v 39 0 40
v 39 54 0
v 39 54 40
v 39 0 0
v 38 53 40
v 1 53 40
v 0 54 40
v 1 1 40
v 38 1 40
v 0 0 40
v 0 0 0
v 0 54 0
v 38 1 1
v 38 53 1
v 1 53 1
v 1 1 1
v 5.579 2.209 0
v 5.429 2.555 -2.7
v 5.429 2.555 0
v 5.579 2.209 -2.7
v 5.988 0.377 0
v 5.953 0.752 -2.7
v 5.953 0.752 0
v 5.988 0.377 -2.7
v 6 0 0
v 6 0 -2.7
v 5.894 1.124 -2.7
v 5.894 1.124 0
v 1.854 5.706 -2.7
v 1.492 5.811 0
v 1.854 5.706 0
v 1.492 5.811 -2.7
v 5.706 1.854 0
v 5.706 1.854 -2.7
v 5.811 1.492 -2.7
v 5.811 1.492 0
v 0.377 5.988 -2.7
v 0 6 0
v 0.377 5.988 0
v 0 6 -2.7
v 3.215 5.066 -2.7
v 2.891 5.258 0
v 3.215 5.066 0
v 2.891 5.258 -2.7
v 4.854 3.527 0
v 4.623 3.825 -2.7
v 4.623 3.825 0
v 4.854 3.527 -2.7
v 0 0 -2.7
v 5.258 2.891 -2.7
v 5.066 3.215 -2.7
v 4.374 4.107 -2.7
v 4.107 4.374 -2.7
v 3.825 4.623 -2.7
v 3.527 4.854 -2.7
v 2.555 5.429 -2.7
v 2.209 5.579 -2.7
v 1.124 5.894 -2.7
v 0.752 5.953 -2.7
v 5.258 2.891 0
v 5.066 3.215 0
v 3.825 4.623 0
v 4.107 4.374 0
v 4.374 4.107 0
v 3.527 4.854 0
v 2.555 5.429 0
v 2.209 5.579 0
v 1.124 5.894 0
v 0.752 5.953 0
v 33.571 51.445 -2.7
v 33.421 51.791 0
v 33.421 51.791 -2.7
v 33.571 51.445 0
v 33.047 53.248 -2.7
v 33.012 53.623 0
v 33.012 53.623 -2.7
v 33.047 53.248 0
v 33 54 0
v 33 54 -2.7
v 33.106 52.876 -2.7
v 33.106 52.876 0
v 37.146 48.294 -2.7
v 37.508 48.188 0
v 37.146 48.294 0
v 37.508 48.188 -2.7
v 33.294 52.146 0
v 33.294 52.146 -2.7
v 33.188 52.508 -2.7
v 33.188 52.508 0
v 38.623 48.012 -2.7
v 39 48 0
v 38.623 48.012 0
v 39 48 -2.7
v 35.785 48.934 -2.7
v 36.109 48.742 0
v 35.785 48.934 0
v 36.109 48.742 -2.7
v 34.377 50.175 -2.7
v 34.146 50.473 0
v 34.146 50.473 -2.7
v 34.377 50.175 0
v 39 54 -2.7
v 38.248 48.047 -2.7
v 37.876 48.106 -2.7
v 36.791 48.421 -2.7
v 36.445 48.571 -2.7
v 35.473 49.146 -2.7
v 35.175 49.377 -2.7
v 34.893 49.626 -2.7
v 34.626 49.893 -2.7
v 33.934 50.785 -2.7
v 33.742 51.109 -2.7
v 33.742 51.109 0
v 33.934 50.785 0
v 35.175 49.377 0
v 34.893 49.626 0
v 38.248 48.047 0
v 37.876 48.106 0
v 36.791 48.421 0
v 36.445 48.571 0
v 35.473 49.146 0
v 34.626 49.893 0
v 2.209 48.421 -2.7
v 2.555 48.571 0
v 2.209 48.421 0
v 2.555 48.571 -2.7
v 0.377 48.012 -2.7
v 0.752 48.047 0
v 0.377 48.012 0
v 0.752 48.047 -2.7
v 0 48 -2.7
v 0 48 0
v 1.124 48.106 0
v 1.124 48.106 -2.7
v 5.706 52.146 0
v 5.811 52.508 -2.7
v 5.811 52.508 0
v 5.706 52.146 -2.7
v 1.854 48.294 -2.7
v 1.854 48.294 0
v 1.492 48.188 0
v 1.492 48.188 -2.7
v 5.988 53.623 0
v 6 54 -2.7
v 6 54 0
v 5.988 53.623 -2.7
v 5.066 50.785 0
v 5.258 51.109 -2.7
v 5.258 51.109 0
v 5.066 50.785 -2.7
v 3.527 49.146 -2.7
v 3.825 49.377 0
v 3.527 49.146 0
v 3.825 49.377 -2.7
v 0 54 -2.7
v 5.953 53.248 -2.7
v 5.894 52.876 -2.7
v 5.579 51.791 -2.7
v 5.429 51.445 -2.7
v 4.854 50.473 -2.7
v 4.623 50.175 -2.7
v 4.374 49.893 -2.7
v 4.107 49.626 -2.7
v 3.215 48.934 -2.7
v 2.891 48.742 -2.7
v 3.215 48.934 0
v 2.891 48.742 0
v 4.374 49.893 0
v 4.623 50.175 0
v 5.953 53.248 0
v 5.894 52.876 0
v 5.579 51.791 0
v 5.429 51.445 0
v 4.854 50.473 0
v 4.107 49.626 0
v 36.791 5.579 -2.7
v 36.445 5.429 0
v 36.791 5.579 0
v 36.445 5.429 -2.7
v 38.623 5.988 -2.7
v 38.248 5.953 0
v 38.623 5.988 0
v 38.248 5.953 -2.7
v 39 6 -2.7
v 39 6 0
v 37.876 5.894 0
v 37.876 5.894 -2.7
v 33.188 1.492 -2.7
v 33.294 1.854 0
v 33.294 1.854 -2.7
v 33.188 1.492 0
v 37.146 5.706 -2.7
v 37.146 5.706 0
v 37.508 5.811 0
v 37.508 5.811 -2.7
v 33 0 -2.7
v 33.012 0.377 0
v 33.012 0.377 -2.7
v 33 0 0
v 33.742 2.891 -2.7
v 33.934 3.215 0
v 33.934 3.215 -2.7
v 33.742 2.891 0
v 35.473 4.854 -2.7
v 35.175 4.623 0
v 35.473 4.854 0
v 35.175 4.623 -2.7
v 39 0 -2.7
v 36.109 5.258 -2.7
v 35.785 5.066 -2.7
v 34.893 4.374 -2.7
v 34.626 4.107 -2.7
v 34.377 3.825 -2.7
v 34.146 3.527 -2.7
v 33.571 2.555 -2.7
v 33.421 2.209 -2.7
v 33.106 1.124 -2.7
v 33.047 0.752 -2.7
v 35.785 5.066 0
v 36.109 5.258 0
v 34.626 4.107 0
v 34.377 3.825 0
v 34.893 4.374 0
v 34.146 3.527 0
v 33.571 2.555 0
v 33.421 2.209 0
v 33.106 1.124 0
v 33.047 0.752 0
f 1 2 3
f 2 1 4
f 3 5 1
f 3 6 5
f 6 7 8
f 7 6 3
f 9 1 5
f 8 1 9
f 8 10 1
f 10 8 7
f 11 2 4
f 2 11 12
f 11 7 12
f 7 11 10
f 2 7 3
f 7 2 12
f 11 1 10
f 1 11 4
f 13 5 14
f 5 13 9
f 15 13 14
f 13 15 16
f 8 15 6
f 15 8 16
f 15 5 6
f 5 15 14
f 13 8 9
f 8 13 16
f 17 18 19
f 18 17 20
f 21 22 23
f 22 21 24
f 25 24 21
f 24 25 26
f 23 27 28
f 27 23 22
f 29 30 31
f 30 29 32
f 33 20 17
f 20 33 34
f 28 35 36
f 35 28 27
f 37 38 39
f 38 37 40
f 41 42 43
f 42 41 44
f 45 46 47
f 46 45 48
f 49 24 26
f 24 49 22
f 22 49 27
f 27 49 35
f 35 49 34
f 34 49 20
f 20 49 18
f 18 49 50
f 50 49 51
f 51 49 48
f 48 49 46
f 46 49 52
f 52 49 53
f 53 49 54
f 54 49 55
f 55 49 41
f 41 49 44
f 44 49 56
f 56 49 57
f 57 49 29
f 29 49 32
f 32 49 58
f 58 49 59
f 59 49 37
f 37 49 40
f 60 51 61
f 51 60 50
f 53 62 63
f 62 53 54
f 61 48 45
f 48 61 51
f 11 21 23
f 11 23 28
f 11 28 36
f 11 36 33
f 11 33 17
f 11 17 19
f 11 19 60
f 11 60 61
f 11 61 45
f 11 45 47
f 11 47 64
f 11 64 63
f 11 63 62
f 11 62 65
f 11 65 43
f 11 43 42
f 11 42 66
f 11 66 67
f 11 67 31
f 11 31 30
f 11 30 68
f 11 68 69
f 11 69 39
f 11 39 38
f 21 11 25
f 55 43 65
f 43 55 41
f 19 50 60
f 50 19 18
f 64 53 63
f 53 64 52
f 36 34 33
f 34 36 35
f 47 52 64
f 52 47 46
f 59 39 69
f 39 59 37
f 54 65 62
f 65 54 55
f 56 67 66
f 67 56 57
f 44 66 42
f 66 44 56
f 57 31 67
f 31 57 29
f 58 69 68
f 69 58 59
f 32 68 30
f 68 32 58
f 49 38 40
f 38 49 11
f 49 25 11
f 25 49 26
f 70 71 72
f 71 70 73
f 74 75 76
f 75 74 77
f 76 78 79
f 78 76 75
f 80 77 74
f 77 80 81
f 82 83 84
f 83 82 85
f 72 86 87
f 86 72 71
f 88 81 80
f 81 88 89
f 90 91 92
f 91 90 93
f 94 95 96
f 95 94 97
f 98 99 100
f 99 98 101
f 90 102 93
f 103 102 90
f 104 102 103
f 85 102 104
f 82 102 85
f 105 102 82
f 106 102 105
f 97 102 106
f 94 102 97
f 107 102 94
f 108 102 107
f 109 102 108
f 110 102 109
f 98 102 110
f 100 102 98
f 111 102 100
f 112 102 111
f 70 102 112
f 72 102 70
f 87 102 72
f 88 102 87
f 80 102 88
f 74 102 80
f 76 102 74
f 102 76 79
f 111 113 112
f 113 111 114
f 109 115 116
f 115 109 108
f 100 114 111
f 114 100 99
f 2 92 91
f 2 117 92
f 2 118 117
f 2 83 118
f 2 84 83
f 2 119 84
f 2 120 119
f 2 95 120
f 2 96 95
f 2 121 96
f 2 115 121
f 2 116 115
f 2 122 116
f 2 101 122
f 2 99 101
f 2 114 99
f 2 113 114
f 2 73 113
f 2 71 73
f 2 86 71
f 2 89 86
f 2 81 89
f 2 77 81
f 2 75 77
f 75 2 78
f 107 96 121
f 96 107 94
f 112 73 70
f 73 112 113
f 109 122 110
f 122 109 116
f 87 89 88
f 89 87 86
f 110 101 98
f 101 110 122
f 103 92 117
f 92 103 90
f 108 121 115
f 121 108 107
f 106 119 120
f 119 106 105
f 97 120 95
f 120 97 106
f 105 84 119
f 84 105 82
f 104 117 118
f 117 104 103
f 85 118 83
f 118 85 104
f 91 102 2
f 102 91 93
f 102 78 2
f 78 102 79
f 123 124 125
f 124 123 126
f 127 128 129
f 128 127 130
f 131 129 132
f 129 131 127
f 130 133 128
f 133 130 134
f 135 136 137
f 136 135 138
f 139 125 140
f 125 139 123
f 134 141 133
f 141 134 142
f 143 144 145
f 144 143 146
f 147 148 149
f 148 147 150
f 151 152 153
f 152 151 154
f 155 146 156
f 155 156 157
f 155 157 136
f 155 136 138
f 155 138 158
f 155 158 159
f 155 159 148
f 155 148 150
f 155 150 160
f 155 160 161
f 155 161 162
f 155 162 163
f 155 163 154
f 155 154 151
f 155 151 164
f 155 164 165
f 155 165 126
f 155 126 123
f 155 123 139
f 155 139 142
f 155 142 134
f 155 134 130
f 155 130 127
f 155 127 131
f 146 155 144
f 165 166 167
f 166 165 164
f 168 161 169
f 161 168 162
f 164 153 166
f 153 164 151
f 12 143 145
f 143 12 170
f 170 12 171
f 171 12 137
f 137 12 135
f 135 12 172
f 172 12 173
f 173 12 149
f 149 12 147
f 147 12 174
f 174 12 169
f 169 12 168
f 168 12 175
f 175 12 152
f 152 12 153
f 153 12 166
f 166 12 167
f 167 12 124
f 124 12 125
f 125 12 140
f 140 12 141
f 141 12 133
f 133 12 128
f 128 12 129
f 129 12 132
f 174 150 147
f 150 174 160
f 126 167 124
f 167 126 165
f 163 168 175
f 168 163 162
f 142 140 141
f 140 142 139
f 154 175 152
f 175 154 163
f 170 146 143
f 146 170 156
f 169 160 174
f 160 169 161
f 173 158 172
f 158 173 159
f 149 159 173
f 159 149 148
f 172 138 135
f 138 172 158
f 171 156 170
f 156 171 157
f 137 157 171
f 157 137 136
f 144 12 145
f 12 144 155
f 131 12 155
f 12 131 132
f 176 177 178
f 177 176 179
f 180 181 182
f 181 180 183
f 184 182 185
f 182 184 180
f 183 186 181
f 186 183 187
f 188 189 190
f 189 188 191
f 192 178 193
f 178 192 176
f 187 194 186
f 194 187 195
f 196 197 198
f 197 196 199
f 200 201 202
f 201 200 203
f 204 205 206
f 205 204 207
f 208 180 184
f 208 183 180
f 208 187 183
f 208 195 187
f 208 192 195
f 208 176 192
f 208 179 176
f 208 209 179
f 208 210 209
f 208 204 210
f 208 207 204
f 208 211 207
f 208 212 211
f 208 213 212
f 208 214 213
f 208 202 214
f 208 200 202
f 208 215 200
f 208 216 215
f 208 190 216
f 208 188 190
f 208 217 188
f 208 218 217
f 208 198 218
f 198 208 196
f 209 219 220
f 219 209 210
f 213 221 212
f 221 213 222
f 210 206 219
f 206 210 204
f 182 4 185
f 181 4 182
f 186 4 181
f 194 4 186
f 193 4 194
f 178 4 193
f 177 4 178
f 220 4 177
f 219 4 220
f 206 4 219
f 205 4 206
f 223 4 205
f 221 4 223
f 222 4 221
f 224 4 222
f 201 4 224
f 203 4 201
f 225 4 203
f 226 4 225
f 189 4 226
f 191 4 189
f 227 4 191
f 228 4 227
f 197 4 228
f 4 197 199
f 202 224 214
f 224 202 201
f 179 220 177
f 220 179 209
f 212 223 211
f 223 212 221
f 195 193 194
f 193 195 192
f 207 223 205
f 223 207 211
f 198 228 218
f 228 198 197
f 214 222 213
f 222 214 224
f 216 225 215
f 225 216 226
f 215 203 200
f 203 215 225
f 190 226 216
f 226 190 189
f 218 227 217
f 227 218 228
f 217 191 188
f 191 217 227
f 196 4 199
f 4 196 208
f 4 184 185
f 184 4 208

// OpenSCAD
x = 1;
y = 1;

module foot()
{
    height = 2.7;
    radius = 6;

    translate([0, 0, height * -1]) intersection() {
        cylinder(h = height, r1 = radius, r2 = radius, $fn = 100);
        cube(radius + 1, radius + 1, height + 1);
    }
}

module feet(w, l)
{
    foot();
    translate([w, l, 0]) rotate([0, 0, 180]) foot();
    translate([0, l, 0]) rotate([0, 0, -90]) foot();
    translate([w, 0, 0]) rotate([0, 0, 90]) foot();
}

module bin(x, y)
{
    w = (39 * x) + (x - 1);
    l = (54 * y) + (y - 1);
    outside = [w, l, 40];
    inside = outside - [2, 2, 0];
    difference() {
        cube(outside);
        translate([1, 1, 1]) cube(inside);
    }
    feet(w, l);
}

bin(x, y);
